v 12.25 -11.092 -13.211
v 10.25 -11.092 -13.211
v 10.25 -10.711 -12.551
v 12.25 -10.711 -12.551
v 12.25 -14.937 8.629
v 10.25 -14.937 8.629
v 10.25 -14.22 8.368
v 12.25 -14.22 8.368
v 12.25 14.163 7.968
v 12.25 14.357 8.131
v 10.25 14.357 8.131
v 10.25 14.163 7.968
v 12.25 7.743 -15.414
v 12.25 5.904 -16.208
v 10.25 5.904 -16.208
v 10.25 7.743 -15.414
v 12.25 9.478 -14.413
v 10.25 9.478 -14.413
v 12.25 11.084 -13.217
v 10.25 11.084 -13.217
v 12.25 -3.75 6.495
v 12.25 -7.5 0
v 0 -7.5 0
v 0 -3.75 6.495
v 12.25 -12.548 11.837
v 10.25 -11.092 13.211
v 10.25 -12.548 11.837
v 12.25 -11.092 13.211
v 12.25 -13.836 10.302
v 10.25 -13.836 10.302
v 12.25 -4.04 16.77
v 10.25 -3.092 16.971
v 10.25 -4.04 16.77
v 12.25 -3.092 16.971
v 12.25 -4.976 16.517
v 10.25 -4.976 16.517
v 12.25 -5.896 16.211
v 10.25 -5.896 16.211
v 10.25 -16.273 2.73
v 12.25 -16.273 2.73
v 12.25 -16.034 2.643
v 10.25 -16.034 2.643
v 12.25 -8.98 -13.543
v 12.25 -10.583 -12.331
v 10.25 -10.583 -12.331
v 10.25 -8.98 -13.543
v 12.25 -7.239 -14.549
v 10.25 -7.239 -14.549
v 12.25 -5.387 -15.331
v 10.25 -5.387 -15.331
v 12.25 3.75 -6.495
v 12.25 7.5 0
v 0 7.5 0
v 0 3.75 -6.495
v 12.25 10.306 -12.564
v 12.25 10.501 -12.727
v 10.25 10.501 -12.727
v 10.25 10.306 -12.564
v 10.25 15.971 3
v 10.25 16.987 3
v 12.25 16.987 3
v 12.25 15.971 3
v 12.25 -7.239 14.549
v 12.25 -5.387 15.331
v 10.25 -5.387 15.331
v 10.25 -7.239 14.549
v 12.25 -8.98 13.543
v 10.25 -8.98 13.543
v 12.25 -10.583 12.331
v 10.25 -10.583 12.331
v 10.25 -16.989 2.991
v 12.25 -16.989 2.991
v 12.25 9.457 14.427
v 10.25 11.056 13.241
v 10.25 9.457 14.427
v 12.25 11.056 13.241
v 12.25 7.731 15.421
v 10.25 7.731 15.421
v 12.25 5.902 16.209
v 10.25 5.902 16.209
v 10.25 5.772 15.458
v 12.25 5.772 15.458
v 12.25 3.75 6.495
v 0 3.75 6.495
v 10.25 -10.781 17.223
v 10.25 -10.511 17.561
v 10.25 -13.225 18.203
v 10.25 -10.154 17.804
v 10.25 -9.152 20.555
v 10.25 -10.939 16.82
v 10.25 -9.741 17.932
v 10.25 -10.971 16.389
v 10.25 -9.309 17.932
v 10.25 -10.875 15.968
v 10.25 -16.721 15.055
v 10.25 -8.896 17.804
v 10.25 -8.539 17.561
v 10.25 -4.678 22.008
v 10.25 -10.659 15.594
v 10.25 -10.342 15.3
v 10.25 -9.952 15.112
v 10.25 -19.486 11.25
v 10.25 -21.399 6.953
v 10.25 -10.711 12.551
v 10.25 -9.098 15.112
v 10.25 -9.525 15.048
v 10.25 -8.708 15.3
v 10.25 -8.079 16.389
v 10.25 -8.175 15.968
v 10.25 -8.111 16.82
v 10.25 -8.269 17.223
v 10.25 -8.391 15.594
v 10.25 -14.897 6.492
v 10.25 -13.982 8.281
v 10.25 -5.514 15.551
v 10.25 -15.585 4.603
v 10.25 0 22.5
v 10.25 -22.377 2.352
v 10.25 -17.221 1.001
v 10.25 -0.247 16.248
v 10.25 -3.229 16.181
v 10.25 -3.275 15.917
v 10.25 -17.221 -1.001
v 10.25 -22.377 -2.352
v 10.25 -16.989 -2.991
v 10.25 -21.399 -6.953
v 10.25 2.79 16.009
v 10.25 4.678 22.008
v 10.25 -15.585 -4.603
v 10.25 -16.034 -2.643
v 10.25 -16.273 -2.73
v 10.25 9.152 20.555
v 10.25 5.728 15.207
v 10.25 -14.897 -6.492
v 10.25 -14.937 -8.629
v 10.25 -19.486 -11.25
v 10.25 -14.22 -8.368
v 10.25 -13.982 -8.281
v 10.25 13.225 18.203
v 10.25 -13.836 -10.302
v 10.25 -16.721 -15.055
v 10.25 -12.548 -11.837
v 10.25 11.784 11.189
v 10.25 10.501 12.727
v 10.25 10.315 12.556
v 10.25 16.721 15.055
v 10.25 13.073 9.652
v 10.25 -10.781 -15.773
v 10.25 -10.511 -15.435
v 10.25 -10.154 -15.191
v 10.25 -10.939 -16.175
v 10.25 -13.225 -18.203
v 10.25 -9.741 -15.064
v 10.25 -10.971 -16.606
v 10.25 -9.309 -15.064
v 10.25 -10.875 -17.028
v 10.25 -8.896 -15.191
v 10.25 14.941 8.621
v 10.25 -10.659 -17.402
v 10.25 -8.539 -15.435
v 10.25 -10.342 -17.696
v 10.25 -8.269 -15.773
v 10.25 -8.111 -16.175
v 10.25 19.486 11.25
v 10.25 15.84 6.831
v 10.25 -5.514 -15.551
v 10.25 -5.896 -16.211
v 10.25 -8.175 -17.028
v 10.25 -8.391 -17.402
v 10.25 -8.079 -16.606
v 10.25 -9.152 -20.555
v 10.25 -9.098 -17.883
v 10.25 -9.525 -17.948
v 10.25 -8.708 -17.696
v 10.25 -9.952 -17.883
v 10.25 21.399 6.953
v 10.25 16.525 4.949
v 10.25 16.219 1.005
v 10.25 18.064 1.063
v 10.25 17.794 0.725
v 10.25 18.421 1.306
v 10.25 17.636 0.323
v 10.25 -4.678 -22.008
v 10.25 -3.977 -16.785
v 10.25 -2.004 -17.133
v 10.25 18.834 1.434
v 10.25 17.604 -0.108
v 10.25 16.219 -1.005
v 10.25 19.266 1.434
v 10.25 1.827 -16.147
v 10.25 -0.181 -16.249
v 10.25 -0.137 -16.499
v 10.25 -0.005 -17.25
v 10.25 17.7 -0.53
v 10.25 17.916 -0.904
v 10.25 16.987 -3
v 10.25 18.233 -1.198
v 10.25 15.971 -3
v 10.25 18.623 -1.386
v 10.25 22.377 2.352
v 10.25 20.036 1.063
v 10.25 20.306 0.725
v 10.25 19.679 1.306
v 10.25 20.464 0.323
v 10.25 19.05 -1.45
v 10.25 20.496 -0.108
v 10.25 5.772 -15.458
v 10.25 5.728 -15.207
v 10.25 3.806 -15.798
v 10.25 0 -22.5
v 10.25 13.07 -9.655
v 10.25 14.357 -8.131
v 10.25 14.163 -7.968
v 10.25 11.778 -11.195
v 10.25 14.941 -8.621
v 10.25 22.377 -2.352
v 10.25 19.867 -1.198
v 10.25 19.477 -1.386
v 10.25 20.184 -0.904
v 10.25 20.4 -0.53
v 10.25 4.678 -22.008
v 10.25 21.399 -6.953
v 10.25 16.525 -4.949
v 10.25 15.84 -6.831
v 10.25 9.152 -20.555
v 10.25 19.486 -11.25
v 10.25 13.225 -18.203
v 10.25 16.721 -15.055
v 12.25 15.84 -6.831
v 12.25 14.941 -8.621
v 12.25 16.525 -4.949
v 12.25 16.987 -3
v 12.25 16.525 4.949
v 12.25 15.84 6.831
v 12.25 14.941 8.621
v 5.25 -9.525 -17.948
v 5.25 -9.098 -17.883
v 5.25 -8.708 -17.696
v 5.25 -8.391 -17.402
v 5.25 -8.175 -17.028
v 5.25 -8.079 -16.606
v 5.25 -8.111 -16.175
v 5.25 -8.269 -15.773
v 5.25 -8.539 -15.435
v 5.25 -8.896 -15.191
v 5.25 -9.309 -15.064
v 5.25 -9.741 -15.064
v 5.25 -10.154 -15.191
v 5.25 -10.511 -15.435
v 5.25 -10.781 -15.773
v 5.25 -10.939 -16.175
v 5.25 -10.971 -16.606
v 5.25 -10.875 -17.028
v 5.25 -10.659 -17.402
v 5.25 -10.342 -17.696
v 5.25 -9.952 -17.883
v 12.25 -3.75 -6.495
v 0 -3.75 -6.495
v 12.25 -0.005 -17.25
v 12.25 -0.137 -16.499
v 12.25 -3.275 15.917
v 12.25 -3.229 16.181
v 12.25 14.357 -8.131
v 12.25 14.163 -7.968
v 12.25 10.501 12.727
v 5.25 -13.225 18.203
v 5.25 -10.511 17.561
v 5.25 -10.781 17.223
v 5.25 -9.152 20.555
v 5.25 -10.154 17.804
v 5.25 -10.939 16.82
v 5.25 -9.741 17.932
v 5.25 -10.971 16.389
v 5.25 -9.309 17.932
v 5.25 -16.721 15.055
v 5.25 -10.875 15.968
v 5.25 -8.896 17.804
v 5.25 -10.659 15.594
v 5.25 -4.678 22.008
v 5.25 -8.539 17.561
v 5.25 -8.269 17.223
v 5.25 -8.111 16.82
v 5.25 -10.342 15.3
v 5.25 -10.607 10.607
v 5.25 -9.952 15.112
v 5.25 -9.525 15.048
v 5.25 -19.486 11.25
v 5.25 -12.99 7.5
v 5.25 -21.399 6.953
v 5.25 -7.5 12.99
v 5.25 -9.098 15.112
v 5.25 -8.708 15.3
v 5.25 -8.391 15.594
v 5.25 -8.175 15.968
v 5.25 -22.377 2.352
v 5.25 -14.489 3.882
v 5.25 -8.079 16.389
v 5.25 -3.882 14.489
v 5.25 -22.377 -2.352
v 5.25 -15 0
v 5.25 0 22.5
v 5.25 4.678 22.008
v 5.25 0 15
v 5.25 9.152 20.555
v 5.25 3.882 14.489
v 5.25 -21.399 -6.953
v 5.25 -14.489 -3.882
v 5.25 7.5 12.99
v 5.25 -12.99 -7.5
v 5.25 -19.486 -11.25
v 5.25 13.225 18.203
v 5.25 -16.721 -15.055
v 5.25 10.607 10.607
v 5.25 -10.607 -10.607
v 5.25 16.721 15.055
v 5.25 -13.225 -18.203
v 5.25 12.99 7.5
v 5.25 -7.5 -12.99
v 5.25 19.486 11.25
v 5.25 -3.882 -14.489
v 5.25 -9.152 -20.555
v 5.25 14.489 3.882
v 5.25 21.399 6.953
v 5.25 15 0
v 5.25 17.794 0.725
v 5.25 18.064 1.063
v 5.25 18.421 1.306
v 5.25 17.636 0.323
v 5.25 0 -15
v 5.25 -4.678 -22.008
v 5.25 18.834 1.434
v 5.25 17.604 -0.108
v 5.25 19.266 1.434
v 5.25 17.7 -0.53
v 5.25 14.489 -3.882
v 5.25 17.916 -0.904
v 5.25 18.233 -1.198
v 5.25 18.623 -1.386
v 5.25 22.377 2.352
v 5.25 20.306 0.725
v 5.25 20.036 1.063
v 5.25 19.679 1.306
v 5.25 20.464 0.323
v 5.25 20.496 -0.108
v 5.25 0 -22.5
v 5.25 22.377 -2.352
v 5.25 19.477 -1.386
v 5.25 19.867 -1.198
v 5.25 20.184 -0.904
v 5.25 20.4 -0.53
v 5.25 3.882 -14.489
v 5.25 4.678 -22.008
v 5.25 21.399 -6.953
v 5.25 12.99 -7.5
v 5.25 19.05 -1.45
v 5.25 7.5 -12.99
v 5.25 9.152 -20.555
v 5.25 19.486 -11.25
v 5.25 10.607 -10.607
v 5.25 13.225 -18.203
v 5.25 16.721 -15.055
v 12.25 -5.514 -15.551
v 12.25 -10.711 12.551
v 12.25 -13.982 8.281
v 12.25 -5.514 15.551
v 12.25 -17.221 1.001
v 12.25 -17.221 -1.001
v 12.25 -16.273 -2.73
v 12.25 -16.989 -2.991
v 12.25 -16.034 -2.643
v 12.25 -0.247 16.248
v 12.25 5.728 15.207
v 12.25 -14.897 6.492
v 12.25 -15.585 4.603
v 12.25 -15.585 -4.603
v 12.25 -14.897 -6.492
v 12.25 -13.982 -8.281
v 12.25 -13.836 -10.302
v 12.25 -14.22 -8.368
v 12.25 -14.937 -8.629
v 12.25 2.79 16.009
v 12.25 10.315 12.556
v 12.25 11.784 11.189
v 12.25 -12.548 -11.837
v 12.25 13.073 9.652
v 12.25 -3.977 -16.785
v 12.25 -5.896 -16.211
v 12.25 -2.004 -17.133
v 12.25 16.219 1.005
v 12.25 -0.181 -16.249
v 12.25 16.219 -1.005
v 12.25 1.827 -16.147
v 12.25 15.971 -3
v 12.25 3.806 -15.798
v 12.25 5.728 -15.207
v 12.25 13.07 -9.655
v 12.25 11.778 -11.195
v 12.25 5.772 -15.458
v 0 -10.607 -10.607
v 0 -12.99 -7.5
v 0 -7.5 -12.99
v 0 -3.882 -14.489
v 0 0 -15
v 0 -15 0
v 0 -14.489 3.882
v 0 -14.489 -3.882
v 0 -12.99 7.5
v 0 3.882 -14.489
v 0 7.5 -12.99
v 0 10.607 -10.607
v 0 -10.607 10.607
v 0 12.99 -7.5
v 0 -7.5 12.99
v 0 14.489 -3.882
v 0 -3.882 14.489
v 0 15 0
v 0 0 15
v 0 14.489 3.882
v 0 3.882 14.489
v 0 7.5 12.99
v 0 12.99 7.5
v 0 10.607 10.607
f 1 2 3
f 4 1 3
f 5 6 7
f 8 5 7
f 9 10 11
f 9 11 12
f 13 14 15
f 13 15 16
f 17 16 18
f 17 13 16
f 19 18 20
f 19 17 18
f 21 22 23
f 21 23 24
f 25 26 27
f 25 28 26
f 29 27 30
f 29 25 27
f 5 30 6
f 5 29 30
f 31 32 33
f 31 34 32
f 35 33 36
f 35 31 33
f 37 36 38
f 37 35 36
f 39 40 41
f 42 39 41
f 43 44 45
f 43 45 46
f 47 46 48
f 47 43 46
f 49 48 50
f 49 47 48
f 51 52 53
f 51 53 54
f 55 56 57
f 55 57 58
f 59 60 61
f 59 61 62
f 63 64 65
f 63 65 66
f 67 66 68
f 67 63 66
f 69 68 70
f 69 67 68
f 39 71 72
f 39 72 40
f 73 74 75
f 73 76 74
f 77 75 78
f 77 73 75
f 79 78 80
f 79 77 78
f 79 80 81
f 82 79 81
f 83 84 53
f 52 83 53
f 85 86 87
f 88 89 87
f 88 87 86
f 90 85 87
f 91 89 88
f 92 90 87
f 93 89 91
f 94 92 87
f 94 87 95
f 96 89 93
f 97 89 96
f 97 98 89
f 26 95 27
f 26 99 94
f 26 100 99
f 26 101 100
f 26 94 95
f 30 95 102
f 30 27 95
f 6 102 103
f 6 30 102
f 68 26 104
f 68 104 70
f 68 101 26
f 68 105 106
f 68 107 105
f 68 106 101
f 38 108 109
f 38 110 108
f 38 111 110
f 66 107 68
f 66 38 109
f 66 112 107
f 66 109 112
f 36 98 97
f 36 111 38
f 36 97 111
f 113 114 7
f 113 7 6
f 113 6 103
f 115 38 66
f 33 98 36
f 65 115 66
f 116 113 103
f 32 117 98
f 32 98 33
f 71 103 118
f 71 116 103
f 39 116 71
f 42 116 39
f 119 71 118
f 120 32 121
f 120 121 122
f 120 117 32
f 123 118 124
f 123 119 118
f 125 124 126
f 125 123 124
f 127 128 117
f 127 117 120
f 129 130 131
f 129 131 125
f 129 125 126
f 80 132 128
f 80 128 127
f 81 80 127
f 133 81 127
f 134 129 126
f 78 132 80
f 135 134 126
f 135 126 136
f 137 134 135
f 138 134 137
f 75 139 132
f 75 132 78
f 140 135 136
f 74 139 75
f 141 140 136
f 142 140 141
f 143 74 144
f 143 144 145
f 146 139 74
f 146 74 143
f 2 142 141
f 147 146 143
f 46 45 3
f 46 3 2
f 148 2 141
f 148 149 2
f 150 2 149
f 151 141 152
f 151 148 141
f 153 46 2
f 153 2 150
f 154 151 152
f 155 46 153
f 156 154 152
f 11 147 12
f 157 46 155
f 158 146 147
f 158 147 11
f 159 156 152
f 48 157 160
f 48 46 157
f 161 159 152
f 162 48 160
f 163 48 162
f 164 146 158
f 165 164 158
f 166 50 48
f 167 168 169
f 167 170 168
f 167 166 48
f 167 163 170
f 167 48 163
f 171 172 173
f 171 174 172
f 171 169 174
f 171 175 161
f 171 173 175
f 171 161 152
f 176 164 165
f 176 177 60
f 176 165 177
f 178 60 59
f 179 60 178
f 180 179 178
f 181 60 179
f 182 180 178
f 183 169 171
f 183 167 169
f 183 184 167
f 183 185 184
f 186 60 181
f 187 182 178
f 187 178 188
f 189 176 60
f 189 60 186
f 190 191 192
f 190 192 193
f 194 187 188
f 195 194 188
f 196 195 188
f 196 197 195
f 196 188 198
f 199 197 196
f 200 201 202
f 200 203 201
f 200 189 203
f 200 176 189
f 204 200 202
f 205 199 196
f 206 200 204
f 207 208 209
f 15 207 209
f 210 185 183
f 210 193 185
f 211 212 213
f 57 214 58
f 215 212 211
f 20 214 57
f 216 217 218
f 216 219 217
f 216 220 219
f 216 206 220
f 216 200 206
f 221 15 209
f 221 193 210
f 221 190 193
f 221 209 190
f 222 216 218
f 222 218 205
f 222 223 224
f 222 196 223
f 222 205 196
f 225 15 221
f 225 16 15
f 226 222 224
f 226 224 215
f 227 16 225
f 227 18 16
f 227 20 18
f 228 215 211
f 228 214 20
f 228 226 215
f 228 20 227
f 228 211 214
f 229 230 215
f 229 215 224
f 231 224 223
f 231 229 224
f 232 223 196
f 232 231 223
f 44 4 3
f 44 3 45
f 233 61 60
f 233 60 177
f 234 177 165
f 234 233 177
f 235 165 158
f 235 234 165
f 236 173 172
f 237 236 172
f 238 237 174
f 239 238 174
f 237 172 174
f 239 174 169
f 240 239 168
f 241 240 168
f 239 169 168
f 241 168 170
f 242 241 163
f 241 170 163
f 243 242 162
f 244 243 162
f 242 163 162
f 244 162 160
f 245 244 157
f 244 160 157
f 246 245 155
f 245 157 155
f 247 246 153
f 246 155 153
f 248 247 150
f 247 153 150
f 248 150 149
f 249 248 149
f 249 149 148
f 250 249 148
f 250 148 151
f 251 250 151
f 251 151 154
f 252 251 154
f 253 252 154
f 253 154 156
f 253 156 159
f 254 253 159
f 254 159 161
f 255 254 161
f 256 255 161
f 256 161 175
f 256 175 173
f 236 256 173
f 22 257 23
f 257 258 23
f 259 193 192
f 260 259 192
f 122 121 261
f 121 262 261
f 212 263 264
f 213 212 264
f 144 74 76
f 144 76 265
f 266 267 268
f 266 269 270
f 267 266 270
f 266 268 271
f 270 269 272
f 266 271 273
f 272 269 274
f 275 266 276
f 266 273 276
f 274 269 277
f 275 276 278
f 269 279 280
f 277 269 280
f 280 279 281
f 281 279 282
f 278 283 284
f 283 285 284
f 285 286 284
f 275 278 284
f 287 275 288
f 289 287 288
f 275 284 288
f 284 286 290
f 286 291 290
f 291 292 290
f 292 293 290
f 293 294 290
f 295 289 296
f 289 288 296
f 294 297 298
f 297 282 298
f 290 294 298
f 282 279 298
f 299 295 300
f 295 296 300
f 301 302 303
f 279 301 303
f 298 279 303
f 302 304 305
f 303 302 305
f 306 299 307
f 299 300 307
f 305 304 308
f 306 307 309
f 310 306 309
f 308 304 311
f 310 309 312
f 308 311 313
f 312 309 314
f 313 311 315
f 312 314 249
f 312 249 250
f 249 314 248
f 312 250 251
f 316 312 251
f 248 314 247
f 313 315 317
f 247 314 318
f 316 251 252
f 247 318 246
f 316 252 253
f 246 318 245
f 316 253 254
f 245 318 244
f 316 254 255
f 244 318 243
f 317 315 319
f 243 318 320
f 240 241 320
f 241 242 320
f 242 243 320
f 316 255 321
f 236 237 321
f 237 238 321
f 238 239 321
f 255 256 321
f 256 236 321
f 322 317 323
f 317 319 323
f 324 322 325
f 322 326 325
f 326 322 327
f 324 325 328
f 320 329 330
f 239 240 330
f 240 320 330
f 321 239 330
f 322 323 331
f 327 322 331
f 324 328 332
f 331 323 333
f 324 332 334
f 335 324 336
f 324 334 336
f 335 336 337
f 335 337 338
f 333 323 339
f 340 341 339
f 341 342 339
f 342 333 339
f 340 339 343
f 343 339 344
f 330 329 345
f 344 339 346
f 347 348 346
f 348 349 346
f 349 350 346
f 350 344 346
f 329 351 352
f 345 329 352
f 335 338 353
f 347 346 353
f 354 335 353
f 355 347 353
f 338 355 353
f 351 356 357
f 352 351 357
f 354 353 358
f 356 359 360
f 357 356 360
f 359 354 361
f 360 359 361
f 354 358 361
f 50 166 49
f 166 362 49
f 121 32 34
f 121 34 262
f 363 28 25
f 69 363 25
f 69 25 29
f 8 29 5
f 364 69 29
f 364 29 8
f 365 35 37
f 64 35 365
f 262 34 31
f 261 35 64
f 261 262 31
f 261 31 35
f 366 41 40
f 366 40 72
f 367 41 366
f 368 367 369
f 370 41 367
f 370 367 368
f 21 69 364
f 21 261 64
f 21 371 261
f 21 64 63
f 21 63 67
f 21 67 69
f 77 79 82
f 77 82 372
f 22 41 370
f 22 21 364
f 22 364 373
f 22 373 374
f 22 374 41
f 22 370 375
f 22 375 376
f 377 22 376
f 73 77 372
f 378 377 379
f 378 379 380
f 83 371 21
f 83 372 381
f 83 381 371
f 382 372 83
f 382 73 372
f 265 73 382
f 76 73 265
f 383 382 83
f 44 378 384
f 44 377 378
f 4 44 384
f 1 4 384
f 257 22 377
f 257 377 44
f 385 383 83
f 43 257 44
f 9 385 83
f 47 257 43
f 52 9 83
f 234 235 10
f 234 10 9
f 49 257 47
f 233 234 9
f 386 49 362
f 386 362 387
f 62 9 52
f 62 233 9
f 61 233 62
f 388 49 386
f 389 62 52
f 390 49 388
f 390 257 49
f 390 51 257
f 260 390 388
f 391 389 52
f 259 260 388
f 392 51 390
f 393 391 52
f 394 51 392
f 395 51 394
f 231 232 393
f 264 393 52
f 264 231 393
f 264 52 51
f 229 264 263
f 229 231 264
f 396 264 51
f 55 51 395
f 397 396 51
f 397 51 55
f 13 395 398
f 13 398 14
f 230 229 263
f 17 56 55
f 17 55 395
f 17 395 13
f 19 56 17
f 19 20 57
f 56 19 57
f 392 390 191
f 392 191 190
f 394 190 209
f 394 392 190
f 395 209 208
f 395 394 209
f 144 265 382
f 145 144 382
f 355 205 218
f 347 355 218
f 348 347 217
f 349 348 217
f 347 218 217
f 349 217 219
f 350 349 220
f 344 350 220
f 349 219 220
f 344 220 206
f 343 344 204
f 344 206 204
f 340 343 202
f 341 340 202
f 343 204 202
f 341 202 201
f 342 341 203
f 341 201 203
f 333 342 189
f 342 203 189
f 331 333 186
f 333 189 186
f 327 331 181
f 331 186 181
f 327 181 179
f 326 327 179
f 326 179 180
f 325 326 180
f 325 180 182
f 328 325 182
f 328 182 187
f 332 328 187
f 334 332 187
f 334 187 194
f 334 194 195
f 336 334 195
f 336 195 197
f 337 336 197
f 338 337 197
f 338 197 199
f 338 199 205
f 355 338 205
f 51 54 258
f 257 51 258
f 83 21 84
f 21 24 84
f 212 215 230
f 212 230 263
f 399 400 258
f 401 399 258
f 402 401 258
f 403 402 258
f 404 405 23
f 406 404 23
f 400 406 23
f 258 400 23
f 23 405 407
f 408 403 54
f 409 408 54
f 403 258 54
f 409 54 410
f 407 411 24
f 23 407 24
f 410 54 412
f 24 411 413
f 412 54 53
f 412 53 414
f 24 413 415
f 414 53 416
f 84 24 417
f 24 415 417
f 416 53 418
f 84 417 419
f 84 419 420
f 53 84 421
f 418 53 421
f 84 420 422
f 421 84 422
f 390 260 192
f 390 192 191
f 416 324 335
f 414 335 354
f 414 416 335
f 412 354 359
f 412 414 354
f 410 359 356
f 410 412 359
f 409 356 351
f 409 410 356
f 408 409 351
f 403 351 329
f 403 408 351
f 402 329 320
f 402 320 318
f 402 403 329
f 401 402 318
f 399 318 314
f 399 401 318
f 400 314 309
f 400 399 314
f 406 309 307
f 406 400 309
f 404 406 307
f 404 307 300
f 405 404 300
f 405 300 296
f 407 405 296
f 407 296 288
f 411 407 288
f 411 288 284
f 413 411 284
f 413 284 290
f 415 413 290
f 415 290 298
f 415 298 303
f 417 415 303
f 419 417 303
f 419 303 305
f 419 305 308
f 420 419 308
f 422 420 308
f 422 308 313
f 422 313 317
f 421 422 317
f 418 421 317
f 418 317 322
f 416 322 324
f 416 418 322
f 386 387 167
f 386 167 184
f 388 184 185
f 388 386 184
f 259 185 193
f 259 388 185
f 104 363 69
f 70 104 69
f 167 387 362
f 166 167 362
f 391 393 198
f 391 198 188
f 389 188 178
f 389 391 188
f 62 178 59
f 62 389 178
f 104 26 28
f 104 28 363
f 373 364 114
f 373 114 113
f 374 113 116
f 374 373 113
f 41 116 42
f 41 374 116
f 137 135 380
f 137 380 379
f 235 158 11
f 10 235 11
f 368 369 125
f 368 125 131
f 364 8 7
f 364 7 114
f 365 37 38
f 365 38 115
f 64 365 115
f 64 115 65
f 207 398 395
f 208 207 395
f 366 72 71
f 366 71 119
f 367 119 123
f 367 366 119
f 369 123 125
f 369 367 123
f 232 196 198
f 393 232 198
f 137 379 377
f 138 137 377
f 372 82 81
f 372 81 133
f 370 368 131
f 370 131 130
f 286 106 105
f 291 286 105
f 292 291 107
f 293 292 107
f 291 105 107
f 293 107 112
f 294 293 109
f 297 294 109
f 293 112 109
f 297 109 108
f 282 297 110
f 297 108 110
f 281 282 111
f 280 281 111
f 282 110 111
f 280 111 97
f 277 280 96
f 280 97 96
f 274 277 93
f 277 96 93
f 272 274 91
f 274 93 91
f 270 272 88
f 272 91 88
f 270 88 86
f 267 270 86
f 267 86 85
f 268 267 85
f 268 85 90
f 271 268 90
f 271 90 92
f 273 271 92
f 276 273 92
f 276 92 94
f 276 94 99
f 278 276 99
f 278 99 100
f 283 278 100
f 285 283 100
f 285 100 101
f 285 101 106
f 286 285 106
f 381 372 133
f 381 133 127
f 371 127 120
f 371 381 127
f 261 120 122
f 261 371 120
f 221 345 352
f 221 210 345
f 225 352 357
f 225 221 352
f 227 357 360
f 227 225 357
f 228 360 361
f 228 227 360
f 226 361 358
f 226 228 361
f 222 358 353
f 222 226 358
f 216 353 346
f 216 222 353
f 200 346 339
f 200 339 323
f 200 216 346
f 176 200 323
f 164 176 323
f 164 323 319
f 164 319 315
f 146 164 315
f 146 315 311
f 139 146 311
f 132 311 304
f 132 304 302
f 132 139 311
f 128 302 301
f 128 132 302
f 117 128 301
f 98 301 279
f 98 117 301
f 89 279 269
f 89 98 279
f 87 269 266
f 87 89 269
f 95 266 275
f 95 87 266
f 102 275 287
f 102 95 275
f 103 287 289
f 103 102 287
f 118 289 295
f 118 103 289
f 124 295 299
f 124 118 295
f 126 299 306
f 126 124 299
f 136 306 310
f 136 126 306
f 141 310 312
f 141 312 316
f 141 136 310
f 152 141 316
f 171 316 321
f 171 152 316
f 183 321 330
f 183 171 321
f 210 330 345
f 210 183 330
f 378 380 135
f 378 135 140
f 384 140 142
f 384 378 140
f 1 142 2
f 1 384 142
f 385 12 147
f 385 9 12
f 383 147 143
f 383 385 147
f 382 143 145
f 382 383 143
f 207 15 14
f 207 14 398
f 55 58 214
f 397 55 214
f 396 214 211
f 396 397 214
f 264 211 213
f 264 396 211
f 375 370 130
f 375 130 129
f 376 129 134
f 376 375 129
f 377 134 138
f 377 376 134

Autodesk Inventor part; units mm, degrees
ref_plane "YZ Plane" through (0, 0, 0) normal (1, 0, 0) x (0, 1, 0)
ref_plane "XZ Plane" through (0, 0, 0) normal (0, 1, 0) x (-1, 0, 0)
sketch "Sketch1" plane through (0, 0, 0) normal (1, 0, 0) x (0, 1, 0)
  line L0 (0, 0) -> (7.5, 0)
  line L1 (7.5, 0) -> (3.75, -6.4952)
  line L2 (3.75, -6.4952) -> (-3.75, -6.4952)
  line L3 (-3.75, -6.4952) -> (-7.5, 0)
  line L4 (-7.5, 0) -> (-3.75, 6.4952)
  line L5 (-3.75, 6.4952) -> (3.75, 6.4952)
  line L6 (3.75, 6.4952) -> (7.5, 0)
  circle A0 centre (0, 0) radius 15
  dimension "d0" = 7.5
  dimension "d1" = 30
extrude "Extrusion1" add sketch "Sketch1" along normal blind 10.25
sketch "Sketch2" plane through (10.25, 0, 0) normal (1, 0, 0) x (0, 0, -1)
  circle A0 centre (0, 0) radius 22.5
  line L0 (-6.4952, 3.75) -> (0, 7.5) projected
  line L1 (-6.4952, -3.75) -> (-6.4952, 3.75) projected
  line L2 (0, -7.5) -> (-6.4952, -3.75) projected
  line L3 (6.4952, -3.75) -> (0, -7.5) projected
  line L4 (6.4952, 3.75) -> (6.4952, -3.75) projected
  line L5 (0, 7.5) -> (6.4952, 3.75) projected
  dimension "d4" = 45
extrude "Extrusion2" add sketch "Sketch2" against normal blind 5
sketch "Sketch3" plane through (10.25, 0, 0) normal (1, 0, 0) x (0, 0, -1)
  circle A0 centre (0, 19.05) radius 1.45
  circle A1 centre (-16.4978, -9.525) radius 1.45
  circle A2 centre (16.4978, -9.525) radius 1.45
  point P0 (0, 0)
  dimension "d11" = 360
extrude "Extrusion3" cut sketch "Sketch3" against normal up to surface (5 mm away)
sketch "Sketch4" plane through (10.25, 0, 0) normal (1, 0, 0) x (0, 0, -1)
  circle A0 centre (0, 19.05) radius 1.45
  line L0 (-3, 17.2409) -> (-3, 16.225)
  line L1 (3, 17.2409) -> (3, 16.225)
  line L2 (13.3804, 11.279) -> (12.7273, 10.5007)
  line L3 (8.7841, 15.1357) -> (8.1311, 14.3574)
  line L4 (17.5, 0.0394) -> (16.4994, -0.137)
  line L5 (16.4581, 5.9483) -> (15.4575, 5.7719)
  line L6 (13.4311, -11.2185) -> (12.5512, -10.7106)
  line L7 (16.4311, -6.0224) -> (15.5512, -5.5144)
  arc A1 (8.7841, 15.1357) -> (3, 17.2409) centre (0, 0) ccw
  arc A2 (16.4311, -6.0224) -> (17.5, 0.0394) centre (0, 0) ccw
  arc A3 (16.4581, 5.9483) -> (13.3804, 11.279) centre (0, 0) ccw
  arc A4 (12.7273, 10.5007) -> (8.1311, 14.3574) centre (0, 0) ccw
  arc A5 (16.4994, -0.137) -> (15.4575, 5.7719) centre (0, 0) ccw
  line L8 (3.0777, -17.2272) -> (2.7302, -16.2726)
  line L9 (3.0777, -17.2272) -> (2.7302, -16.2726)
  line L10 (8.7158, -15.1751) -> (8.3683, -14.2204)
  line L11 (8.7158, -15.1751) -> (8.3683, -14.2204)
  line L12 (-8.7158, -15.1751) -> (-8.3683, -14.2204)
  line L13 (-8.7158, -15.1751) -> (-8.3683, -14.2204)
  line L14 (-3.0777, -17.2272) -> (-2.7302, -16.2726)
  line L15 (-3.0777, -17.2272) -> (-2.7302, -16.2726)
  line L16 (-16.4311, -6.0224) -> (-15.5512, -5.5144)
  line L17 (-16.4311, -6.0224) -> (-15.5512, -5.5144)
  line L18 (-13.4311, -11.2185) -> (-12.5512, -10.7106)
  line L19 (-13.4311, -11.2185) -> (-12.5512, -10.7106)
  arc A6 (8.7158, -15.1751) -> (13.4311, -11.2185) centre (0, 0) ccw
  arc A7 (-13.4311, -11.2185) -> (-8.7158, -15.1751) centre (0, 0) ccw
  arc A8 (-3.0777, -17.2272) -> (3.0777, -17.2272) centre (0, 0) ccw
  arc A9 (12.5512, -10.7106) -> (15.5512, -5.5144) centre (0, 0) ccw
  arc A10 (2.7302, -16.2726) -> (8.3683, -14.2204) centre (0, 0) ccw
  arc A11 (-8.3683, -14.2204) -> (-2.7302, -16.2726) centre (0, 0) ccw
  line L20 (-8.7841, 15.1357) -> (-8.1311, 14.3574)
  line L21 (-13.4115, 11.2412) -> (-12.7273, 10.5007)
  line L22 (-16.4586, 5.9455) -> (-15.4575, 5.7719)
  line L23 (-16.4311, -6.0224) -> (-15.5512, -5.5144)
  line L24 (-13.4311, -11.2185) -> (-12.5512, -10.7106)
  arc A12 (-3, 17.2409) -> (-8.7841, 15.1357) centre (0, 0) ccw
  arc A13 (-13.4115, 11.2412) -> (-15.8894, 7.3321) centre (0, 0) ccw
  arc A14 (-17.2328, -3.0466) -> (-16.4311, -6.0224) centre (0, 0) ccw
  arc A15 (-15.5512, -5.5144) -> (-12.5512, -10.7106) centre (0, 0) ccw
  arc A16 (3, 16.225) -> (-3, 16.225) centre (0, 0) ccw
  arc A17 (-8.1311, 14.3574) -> (-12.7273, 10.5007) centre (0, 0) ccw
  line L25 (-6.4952, 3.75) -> (0, 7.5)
  line L26 (-6.4952, -3.75) -> (-6.4952, 3.75)
  line L27 (0, -7.5) -> (-6.4952, -3.75)
  line L28 (6.4952, -3.75) -> (0, -7.5)
  line L29 (6.4952, 3.75) -> (6.4952, -3.75)
  line L30 (0, 7.5) -> (6.4952, 3.75)
  line L31 (-17.2328, -3.0466) -> (-16.181, -3.229)
  arc A18 (-3, 17.2409) -> (-8.7841, 15.1357) centre (0, 0) ccw
  arc A19 (8.7841, 15.1357) -> (3, 17.2409) centre (0, 0) ccw
  arc A20 (16.4581, 5.9483) -> (13.3804, 11.279) centre (0, 0) ccw
  arc A21 (16.4311, -6.0224) -> (17.5, 0.0394) centre (0, 0) ccw
  arc A22 (8.7158, -15.1751) -> (13.4311, -11.2185) centre (0, 0) ccw
  arc A23 (-3.0777, -17.2272) -> (3.0777, -17.2272) centre (0, 0) ccw
  arc A24 (-13.4311, -11.2185) -> (-8.7158, -15.1751) centre (0, 0) ccw
  arc A25 (-13.4115, 11.2412) -> (-16.4586, 5.9455) centre (0, 0) ccw
  arc A26 (3, 16.225) -> (-3, 16.225) centre (0, 0) ccw
  arc A27 (12.7273, 10.5007) -> (8.1311, 14.3574) centre (0, 0) ccw
  arc A28 (16.4994, -0.137) -> (15.4575, 5.7719) centre (0, 0) ccw
  arc A29 (12.5512, -10.7106) -> (15.5512, -5.5144) centre (0, 0) ccw
  arc A30 (2.7302, -16.2726) -> (8.3683, -14.2204) centre (0, 0) ccw
  arc A31 (-8.3683, -14.2204) -> (-2.7302, -16.2726) centre (0, 0) ccw
  arc A32 (-15.4575, 5.7719) -> (-16.181, -3.229) centre (0, 0) ccw
  arc A33 (-15.5512, -5.5144) -> (-12.5512, -10.7106) centre (0, 0) ccw
  arc A34 (-8.3683, -14.2204) -> (-2.7302, -16.2726) centre (0, 0) ccw
  arc A35 (2.7302, -16.2726) -> (8.3683, -14.2204) centre (0, 0) ccw
  arc A36 (12.5512, -10.7106) -> (15.5512, -5.5144) centre (0, 0) ccw
  arc A37 (16.4994, -0.137) -> (15.4575, 5.7719) centre (0, 0) ccw
  arc A38 (12.7273, 10.5007) -> (8.1311, 14.3574) centre (0, 0) ccw
  arc A39 (3, 16.225) -> (-3, 16.225) centre (0, 0) ccw
  arc A40 (-8.1311, 14.3574) -> (-12.7273, 10.5007) centre (0, 0) ccw
  line L32 (-16.181, -3.229) -> (-17.2328, -3.0466)
  line L33 (-8.7158, -15.1751) -> (-8.3683, -14.2204)
  line L34 (-3.0777, -17.2272) -> (-2.7302, -16.2726)
  line L35 (3.0777, -17.2272) -> (2.7302, -16.2726)
  line L36 (8.3683, -14.2204) -> (8.7158, -15.1751)
  line L37 (12.5512, -10.7106) -> (13.4311, -11.2185)
  line L38 (15.5512, -5.5144) -> (16.4311, -6.0224)
  line L39 (16.4994, -0.137) -> (17.5, 0.0394)
  line L40 (15.4575, 5.7719) -> (16.4581, 5.9483)
  line L41 (12.7273, 10.5007) -> (13.3804, 11.279)
  line L42 (8.1311, 14.3574) -> (8.7841, 15.1357)
  line L43 (3, 16.225) -> (3, 17.2409)
  line L44 (-3, 16.225) -> (-3, 17.2409)
  line L45 (-8.1311, 14.3574) -> (-8.7841, 15.1357)
  line L46 (-12.7273, 10.5007) -> (-13.3804, 11.279)
  line L47 (-12.7273, 10.5007) -> (-13.3804, 11.279)
  line L48 (-15.4575, 5.7719) -> (-16.4586, 5.9455)
  line L49 (-16.181, -3.229) -> (-17.2328, -3.0466)
  line L50 (-16.4311, -6.0224) -> (-15.5512, -5.5144)
  line L51 (-13.4311, -11.2185) -> (-12.5512, -10.7106)
  line L52 (-8.7158, -15.1751) -> (-8.3683, -14.2204)
  line L53 (-3.0777, -17.2272) -> (-2.7302, -16.2726)
  line L54 (3.0777, -17.2272) -> (2.7302, -16.2726)
  point P0 (15.5512, -5.5144)
  point P1 (-8.7158, -15.1751)
  point P2 (-3.0777, -17.2272)
  point P3 (3.0777, -17.2272)
  point P4 (2.7302, -16.2726)
  point P5 (8.7158, -15.1751)
  point P6 (-15.5512, -5.5144)
  point P7 (-2.7302, -16.2726)
  point P8 (-8.3683, -14.2204)
  point P9 (8.3683, -14.2204)
  point P10 (2.7302, -16.2726)
ref_plane "Work Plane1" through (12.15, 0, 0) normal (1, 0, 0) x (0, 0, -1)
sketch "Sketch5" plane through (12.15, 0, 0) normal (1, 0, 0) x (0, 0, -1)
  line L0 (6.4952, 3.75) -> (6.4952, -3.75) projected
  circle A0 centre (0, 0) radius 7.5
extrude "Extrusion6" add sketch "Sketch4" along normal blind 2 contours L0 A16 L1 A1 L3 A4 L2 A3 L5 A5 L4 A2 L7 A9 L6 A6 L10 A10 L8 A8 L14 A11 L12 A7 L18 A15 L16 A14 L31 A32 L22 A25 A13 L21 A17 L20 A12
sketch "Sketch6" plane through (12.25, 0, 0) normal (1, 0, 0) x (0, 0, -1)
  arc A0 (-13.4115, 11.2412) -> (-16.4586, 5.9455) centre (0, 0) ccw projected
  line L0 (-16.4586, 5.9455) -> (-15.4575, 5.7719) projected
  arc A1 (-15.4575, 5.7719) -> (-16.181, -3.229) centre (0, 0) ccw projected
  line L1 (-16.181, -3.229) -> (-17.2328, -3.0466) projected
  arc A2 (-17.2328, -3.0466) -> (-16.4311, -6.0224) centre (0, 0) ccw projected
  line L2 (-16.4311, -6.0224) -> (-15.5512, -5.5144) projected
  arc A3 (-15.5512, -5.5144) -> (-12.5512, -10.7106) centre (0, 0) ccw projected
  line L3 (-12.5512, -10.7106) -> (-13.4311, -11.2185) projected
  arc A4 (-13.4311, -11.2185) -> (-8.7158, -15.1751) centre (0, 0) ccw projected
  line L4 (-8.7158, -15.1751) -> (-8.3683, -14.2204) projected
  arc A5 (-8.3683, -14.2204) -> (-2.7302, -16.2726) centre (0, 0) ccw projected
  line L5 (-2.7302, -16.2726) -> (-3.0777, -17.2272) projected
  arc A6 (-3.0777, -17.2272) -> (3.0777, -17.2272) centre (0, 0) ccw projected
  line L6 (3.0777, -17.2272) -> (2.7302, -16.2726) projected
  arc A7 (2.7302, -16.2726) -> (8.3683, -14.2204) centre (0, 0) ccw projected
  line L7 (8.3683, -14.2204) -> (8.7158, -15.1751) projected
  arc A8 (8.7158, -15.1751) -> (13.4311, -11.2185) centre (0, 0) ccw projected
  line L8 (13.4311, -11.2185) -> (12.5512, -10.7106) projected
  arc A9 (12.5512, -10.7106) -> (15.5512, -5.5144) centre (0, 0) ccw projected
  line L9 (15.5512, -5.5144) -> (16.4311, -6.0224) projected
  arc A10 (16.4311, -6.0224) -> (17.5, 0.0394) centre (0, 0) ccw projected
  line L10 (17.5, 0.0394) -> (16.4994, -0.137) projected
  arc A11 (16.4994, -0.137) -> (15.4575, 5.7719) centre (0, 0) ccw projected
  line L11 (15.4575, 5.7719) -> (16.4581, 5.9483) projected
  arc A12 (16.4581, 5.9483) -> (13.3804, 11.279) centre (0, 0) ccw projected
  line L12 (13.3804, 11.279) -> (12.7273, 10.5007) projected
  arc A13 (12.7273, 10.5007) -> (8.1311, 14.3574) centre (0, 0) ccw projected
  line L13 (8.1311, 14.3574) -> (8.7841, 15.1357) projected
  arc A14 (8.7841, 15.1357) -> (3, 17.2409) centre (0, 0) ccw projected
  line L14 (3, 17.2409) -> (3, 16.225) projected
  arc A15 (3, 16.225) -> (-3, 16.225) centre (0, 0) ccw projected
  line L15 (-3, 16.225) -> (-3, 17.2409) projected
  arc A16 (-3, 17.2409) -> (-8.7841, 15.1357) centre (0, 0) ccw projected
  line L16 (-8.7841, 15.1357) -> (-8.1311, 14.3574) projected
  arc A17 (-8.1311, 14.3574) -> (-12.7273, 10.5007) centre (0, 0) ccw projected
  line L17 (-12.7273, 10.5007) -> (-13.4115, 11.2412) projected
  line L18 (-6.4952, 3.75) -> (0, 7.5) projected
  line L19 (0, 7.5) -> (6.4952, 3.75) projected
  line L20 (6.4952, 3.75) -> (6.4952, -3.75) projected
  line L21 (6.4952, -3.75) -> (0, -7.5) projected
  line L22 (0, -7.5) -> (-6.4952, -3.75) projected
  line L23 (-6.4952, -3.75) -> (-6.4952, 3.75) projected
  arc A18 (3, 16.225) -> (-3, 16.225) centre (0, 0) ccw projected
  line L24 (3, 16.225) -> (3, 15.9707)
  line L25 (8.1311, 14.3574) -> (7.9676, 14.1626)
  line L26 (12.7273, 10.5007) -> (12.5639, 10.3059)
  line L27 (15.4575, 5.7719) -> (15.2071, 5.7277)
  line L28 (16.4994, -0.137) -> (16.249, -0.1811)
  line L29 (15.5512, -5.5144) -> (16.4311, -6.0224) projected
  line L30 (15.5512, -5.5144) -> (15.331, -5.3873)
  line L31 (12.5512, -10.7106) -> (13.4311, -11.2185) projected
  line L32 (12.5512, -10.7106) -> (12.331, -10.5834)
  line L33 (8.7158, -15.1751) -> (8.3683, -14.2204) projected
  line L34 (8.3683, -14.2204) -> (8.2814, -13.9815)
  line L35 (2.7302, -16.2726) -> (2.6432, -16.0336)
  arc A19 (-8.3683, -14.2204) -> (-2.7302, -16.2726) centre (0, 0) ccw projected
  line L36 (-2.7302, -16.2726) -> (-2.6432, -16.0336)
  line L37 (-8.3683, -14.2204) -> (-8.2814, -13.9815)
  line L38 (-12.5512, -10.7106) -> (-12.331, -10.5834)
  line L39 (-15.5512, -5.5144) -> (-15.331, -5.3873)
  arc A20 (-15.4575, 5.7719) -> (-16.181, -3.229) centre (0, 0) ccw projected
  line L40 (-16.181, -3.229) -> (-15.9166, -3.2749)
  line L41 (-15.4575, 5.7719) -> (-15.2068, 5.7284)
  line L42 (-12.7273, 10.5007) -> (-12.5561, 10.3154)
  line L43 (-8.1311, 14.3574) -> (-7.9676, 14.1626)
  line L44 (-3, 16.225) -> (-3, 15.9707)
  arc A21 (-7.9676, 14.1626) -> (-12.5561, 10.3154) centre (0, 0) ccw
  arc A22 (-15.2068, 5.7284) -> (-15.9166, -3.2749) centre (0, 0) ccw
  arc A23 (-15.331, -5.3873) -> (-12.331, -10.5834) centre (0, 0) ccw
  arc A24 (-8.2814, -13.9815) -> (-2.6432, -16.0336) centre (0, 0) ccw
  arc A25 (2.6432, -16.0336) -> (8.2814, -13.9815) centre (0, 0) ccw
  arc A26 (12.331, -10.5834) -> (15.331, -5.3873) centre (0, 0) ccw
  arc A27 (16.249, -0.1811) -> (15.2071, 5.7277) centre (0, 0) ccw
  arc A28 (12.5639, 10.3059) -> (7.9676, 14.1626) centre (0, 0) ccw
  arc A29 (3, 15.9707) -> (-3, 15.9707) centre (0, 0) ccw
  arc A30 (-3, 16.9871) -> (-8.621, 14.9413) centre (0, 0) ccw
  arc A31 (-13.2408, 11.0564) -> (-16.2089, 5.9022) centre (0, 0) ccw
  arc A32 (-16.9706, -3.092) -> (-16.2113, -5.8955) centre (0, 0) ccw
  arc A33 (-13.2113, -11.0916) -> (-8.629, -14.9366) centre (0, 0) ccw
  arc A34 (-2.9909, -16.9887) -> (2.9909, -16.9887) centre (0, 0) ccw
  arc A35 (8.629, -14.9366) -> (13.2113, -11.0916) centre (0, 0) ccw
  arc A36 (16.2113, -5.8955) -> (17.25, -0.0046) centre (0, 0) ccw
  arc A37 (16.2081, 5.9042) -> (13.2172, 11.0845) centre (0, 0) ccw
  arc A38 (8.621, 14.9413) -> (3, 16.9871) centre (0, 0) ccw
  circle A39 centre (0, 0) radius 17.5
  point P0 (-8.7158, -15.1751)
  point P1 (3.0777, -17.2272)
  point P2 (13.4311, -11.2185)
  point P3 (17.5, 0.0394)
  point P4 (3, 17.2409)
  point P5 (-16.4311, -6.0224)
  point P6 (16.2113, -5.8955)
  point P7 (13.2113, -11.0916)
  point P8 (8.629, -14.9366)
extrude "Extrusion7" cut sketch "Sketch6" against normal up to surface (2 mm away) contours L17 A31 L0 A0 | A39 L16 A17 L17 | L0 A1 L1 A39 | A16 L15 A30 L16 | L1 A32 L2 A2 | A17 L43 A21 L42 | A39 L14 A15 L15 | L41 A22 L40 A1 | L2 A3 L3 A39 | A14 L13 A38 L14 | L3 A33 L4 A4 | A15 L24 A29 L44 | A39 L12 A13 L13 | L39 A23 L38 A3 | L4 A5 L5 A39 | A12 L11 A37 L12 | L5 A34 L6 A6 | A13 L26 A28 L25 | A39 L10 A11 L11 | L37 A24 L36 A5 | L6 A7 L7 A39 | A10 L9 A36 L10 | L7 A35 L8 A8 | A11 L28 A27 L27 | L35 A25 L34 A7 | L8 A9 L9 A39 | A9 L32 A26 L30
properties part number "wheel_gearing_mount_short"
